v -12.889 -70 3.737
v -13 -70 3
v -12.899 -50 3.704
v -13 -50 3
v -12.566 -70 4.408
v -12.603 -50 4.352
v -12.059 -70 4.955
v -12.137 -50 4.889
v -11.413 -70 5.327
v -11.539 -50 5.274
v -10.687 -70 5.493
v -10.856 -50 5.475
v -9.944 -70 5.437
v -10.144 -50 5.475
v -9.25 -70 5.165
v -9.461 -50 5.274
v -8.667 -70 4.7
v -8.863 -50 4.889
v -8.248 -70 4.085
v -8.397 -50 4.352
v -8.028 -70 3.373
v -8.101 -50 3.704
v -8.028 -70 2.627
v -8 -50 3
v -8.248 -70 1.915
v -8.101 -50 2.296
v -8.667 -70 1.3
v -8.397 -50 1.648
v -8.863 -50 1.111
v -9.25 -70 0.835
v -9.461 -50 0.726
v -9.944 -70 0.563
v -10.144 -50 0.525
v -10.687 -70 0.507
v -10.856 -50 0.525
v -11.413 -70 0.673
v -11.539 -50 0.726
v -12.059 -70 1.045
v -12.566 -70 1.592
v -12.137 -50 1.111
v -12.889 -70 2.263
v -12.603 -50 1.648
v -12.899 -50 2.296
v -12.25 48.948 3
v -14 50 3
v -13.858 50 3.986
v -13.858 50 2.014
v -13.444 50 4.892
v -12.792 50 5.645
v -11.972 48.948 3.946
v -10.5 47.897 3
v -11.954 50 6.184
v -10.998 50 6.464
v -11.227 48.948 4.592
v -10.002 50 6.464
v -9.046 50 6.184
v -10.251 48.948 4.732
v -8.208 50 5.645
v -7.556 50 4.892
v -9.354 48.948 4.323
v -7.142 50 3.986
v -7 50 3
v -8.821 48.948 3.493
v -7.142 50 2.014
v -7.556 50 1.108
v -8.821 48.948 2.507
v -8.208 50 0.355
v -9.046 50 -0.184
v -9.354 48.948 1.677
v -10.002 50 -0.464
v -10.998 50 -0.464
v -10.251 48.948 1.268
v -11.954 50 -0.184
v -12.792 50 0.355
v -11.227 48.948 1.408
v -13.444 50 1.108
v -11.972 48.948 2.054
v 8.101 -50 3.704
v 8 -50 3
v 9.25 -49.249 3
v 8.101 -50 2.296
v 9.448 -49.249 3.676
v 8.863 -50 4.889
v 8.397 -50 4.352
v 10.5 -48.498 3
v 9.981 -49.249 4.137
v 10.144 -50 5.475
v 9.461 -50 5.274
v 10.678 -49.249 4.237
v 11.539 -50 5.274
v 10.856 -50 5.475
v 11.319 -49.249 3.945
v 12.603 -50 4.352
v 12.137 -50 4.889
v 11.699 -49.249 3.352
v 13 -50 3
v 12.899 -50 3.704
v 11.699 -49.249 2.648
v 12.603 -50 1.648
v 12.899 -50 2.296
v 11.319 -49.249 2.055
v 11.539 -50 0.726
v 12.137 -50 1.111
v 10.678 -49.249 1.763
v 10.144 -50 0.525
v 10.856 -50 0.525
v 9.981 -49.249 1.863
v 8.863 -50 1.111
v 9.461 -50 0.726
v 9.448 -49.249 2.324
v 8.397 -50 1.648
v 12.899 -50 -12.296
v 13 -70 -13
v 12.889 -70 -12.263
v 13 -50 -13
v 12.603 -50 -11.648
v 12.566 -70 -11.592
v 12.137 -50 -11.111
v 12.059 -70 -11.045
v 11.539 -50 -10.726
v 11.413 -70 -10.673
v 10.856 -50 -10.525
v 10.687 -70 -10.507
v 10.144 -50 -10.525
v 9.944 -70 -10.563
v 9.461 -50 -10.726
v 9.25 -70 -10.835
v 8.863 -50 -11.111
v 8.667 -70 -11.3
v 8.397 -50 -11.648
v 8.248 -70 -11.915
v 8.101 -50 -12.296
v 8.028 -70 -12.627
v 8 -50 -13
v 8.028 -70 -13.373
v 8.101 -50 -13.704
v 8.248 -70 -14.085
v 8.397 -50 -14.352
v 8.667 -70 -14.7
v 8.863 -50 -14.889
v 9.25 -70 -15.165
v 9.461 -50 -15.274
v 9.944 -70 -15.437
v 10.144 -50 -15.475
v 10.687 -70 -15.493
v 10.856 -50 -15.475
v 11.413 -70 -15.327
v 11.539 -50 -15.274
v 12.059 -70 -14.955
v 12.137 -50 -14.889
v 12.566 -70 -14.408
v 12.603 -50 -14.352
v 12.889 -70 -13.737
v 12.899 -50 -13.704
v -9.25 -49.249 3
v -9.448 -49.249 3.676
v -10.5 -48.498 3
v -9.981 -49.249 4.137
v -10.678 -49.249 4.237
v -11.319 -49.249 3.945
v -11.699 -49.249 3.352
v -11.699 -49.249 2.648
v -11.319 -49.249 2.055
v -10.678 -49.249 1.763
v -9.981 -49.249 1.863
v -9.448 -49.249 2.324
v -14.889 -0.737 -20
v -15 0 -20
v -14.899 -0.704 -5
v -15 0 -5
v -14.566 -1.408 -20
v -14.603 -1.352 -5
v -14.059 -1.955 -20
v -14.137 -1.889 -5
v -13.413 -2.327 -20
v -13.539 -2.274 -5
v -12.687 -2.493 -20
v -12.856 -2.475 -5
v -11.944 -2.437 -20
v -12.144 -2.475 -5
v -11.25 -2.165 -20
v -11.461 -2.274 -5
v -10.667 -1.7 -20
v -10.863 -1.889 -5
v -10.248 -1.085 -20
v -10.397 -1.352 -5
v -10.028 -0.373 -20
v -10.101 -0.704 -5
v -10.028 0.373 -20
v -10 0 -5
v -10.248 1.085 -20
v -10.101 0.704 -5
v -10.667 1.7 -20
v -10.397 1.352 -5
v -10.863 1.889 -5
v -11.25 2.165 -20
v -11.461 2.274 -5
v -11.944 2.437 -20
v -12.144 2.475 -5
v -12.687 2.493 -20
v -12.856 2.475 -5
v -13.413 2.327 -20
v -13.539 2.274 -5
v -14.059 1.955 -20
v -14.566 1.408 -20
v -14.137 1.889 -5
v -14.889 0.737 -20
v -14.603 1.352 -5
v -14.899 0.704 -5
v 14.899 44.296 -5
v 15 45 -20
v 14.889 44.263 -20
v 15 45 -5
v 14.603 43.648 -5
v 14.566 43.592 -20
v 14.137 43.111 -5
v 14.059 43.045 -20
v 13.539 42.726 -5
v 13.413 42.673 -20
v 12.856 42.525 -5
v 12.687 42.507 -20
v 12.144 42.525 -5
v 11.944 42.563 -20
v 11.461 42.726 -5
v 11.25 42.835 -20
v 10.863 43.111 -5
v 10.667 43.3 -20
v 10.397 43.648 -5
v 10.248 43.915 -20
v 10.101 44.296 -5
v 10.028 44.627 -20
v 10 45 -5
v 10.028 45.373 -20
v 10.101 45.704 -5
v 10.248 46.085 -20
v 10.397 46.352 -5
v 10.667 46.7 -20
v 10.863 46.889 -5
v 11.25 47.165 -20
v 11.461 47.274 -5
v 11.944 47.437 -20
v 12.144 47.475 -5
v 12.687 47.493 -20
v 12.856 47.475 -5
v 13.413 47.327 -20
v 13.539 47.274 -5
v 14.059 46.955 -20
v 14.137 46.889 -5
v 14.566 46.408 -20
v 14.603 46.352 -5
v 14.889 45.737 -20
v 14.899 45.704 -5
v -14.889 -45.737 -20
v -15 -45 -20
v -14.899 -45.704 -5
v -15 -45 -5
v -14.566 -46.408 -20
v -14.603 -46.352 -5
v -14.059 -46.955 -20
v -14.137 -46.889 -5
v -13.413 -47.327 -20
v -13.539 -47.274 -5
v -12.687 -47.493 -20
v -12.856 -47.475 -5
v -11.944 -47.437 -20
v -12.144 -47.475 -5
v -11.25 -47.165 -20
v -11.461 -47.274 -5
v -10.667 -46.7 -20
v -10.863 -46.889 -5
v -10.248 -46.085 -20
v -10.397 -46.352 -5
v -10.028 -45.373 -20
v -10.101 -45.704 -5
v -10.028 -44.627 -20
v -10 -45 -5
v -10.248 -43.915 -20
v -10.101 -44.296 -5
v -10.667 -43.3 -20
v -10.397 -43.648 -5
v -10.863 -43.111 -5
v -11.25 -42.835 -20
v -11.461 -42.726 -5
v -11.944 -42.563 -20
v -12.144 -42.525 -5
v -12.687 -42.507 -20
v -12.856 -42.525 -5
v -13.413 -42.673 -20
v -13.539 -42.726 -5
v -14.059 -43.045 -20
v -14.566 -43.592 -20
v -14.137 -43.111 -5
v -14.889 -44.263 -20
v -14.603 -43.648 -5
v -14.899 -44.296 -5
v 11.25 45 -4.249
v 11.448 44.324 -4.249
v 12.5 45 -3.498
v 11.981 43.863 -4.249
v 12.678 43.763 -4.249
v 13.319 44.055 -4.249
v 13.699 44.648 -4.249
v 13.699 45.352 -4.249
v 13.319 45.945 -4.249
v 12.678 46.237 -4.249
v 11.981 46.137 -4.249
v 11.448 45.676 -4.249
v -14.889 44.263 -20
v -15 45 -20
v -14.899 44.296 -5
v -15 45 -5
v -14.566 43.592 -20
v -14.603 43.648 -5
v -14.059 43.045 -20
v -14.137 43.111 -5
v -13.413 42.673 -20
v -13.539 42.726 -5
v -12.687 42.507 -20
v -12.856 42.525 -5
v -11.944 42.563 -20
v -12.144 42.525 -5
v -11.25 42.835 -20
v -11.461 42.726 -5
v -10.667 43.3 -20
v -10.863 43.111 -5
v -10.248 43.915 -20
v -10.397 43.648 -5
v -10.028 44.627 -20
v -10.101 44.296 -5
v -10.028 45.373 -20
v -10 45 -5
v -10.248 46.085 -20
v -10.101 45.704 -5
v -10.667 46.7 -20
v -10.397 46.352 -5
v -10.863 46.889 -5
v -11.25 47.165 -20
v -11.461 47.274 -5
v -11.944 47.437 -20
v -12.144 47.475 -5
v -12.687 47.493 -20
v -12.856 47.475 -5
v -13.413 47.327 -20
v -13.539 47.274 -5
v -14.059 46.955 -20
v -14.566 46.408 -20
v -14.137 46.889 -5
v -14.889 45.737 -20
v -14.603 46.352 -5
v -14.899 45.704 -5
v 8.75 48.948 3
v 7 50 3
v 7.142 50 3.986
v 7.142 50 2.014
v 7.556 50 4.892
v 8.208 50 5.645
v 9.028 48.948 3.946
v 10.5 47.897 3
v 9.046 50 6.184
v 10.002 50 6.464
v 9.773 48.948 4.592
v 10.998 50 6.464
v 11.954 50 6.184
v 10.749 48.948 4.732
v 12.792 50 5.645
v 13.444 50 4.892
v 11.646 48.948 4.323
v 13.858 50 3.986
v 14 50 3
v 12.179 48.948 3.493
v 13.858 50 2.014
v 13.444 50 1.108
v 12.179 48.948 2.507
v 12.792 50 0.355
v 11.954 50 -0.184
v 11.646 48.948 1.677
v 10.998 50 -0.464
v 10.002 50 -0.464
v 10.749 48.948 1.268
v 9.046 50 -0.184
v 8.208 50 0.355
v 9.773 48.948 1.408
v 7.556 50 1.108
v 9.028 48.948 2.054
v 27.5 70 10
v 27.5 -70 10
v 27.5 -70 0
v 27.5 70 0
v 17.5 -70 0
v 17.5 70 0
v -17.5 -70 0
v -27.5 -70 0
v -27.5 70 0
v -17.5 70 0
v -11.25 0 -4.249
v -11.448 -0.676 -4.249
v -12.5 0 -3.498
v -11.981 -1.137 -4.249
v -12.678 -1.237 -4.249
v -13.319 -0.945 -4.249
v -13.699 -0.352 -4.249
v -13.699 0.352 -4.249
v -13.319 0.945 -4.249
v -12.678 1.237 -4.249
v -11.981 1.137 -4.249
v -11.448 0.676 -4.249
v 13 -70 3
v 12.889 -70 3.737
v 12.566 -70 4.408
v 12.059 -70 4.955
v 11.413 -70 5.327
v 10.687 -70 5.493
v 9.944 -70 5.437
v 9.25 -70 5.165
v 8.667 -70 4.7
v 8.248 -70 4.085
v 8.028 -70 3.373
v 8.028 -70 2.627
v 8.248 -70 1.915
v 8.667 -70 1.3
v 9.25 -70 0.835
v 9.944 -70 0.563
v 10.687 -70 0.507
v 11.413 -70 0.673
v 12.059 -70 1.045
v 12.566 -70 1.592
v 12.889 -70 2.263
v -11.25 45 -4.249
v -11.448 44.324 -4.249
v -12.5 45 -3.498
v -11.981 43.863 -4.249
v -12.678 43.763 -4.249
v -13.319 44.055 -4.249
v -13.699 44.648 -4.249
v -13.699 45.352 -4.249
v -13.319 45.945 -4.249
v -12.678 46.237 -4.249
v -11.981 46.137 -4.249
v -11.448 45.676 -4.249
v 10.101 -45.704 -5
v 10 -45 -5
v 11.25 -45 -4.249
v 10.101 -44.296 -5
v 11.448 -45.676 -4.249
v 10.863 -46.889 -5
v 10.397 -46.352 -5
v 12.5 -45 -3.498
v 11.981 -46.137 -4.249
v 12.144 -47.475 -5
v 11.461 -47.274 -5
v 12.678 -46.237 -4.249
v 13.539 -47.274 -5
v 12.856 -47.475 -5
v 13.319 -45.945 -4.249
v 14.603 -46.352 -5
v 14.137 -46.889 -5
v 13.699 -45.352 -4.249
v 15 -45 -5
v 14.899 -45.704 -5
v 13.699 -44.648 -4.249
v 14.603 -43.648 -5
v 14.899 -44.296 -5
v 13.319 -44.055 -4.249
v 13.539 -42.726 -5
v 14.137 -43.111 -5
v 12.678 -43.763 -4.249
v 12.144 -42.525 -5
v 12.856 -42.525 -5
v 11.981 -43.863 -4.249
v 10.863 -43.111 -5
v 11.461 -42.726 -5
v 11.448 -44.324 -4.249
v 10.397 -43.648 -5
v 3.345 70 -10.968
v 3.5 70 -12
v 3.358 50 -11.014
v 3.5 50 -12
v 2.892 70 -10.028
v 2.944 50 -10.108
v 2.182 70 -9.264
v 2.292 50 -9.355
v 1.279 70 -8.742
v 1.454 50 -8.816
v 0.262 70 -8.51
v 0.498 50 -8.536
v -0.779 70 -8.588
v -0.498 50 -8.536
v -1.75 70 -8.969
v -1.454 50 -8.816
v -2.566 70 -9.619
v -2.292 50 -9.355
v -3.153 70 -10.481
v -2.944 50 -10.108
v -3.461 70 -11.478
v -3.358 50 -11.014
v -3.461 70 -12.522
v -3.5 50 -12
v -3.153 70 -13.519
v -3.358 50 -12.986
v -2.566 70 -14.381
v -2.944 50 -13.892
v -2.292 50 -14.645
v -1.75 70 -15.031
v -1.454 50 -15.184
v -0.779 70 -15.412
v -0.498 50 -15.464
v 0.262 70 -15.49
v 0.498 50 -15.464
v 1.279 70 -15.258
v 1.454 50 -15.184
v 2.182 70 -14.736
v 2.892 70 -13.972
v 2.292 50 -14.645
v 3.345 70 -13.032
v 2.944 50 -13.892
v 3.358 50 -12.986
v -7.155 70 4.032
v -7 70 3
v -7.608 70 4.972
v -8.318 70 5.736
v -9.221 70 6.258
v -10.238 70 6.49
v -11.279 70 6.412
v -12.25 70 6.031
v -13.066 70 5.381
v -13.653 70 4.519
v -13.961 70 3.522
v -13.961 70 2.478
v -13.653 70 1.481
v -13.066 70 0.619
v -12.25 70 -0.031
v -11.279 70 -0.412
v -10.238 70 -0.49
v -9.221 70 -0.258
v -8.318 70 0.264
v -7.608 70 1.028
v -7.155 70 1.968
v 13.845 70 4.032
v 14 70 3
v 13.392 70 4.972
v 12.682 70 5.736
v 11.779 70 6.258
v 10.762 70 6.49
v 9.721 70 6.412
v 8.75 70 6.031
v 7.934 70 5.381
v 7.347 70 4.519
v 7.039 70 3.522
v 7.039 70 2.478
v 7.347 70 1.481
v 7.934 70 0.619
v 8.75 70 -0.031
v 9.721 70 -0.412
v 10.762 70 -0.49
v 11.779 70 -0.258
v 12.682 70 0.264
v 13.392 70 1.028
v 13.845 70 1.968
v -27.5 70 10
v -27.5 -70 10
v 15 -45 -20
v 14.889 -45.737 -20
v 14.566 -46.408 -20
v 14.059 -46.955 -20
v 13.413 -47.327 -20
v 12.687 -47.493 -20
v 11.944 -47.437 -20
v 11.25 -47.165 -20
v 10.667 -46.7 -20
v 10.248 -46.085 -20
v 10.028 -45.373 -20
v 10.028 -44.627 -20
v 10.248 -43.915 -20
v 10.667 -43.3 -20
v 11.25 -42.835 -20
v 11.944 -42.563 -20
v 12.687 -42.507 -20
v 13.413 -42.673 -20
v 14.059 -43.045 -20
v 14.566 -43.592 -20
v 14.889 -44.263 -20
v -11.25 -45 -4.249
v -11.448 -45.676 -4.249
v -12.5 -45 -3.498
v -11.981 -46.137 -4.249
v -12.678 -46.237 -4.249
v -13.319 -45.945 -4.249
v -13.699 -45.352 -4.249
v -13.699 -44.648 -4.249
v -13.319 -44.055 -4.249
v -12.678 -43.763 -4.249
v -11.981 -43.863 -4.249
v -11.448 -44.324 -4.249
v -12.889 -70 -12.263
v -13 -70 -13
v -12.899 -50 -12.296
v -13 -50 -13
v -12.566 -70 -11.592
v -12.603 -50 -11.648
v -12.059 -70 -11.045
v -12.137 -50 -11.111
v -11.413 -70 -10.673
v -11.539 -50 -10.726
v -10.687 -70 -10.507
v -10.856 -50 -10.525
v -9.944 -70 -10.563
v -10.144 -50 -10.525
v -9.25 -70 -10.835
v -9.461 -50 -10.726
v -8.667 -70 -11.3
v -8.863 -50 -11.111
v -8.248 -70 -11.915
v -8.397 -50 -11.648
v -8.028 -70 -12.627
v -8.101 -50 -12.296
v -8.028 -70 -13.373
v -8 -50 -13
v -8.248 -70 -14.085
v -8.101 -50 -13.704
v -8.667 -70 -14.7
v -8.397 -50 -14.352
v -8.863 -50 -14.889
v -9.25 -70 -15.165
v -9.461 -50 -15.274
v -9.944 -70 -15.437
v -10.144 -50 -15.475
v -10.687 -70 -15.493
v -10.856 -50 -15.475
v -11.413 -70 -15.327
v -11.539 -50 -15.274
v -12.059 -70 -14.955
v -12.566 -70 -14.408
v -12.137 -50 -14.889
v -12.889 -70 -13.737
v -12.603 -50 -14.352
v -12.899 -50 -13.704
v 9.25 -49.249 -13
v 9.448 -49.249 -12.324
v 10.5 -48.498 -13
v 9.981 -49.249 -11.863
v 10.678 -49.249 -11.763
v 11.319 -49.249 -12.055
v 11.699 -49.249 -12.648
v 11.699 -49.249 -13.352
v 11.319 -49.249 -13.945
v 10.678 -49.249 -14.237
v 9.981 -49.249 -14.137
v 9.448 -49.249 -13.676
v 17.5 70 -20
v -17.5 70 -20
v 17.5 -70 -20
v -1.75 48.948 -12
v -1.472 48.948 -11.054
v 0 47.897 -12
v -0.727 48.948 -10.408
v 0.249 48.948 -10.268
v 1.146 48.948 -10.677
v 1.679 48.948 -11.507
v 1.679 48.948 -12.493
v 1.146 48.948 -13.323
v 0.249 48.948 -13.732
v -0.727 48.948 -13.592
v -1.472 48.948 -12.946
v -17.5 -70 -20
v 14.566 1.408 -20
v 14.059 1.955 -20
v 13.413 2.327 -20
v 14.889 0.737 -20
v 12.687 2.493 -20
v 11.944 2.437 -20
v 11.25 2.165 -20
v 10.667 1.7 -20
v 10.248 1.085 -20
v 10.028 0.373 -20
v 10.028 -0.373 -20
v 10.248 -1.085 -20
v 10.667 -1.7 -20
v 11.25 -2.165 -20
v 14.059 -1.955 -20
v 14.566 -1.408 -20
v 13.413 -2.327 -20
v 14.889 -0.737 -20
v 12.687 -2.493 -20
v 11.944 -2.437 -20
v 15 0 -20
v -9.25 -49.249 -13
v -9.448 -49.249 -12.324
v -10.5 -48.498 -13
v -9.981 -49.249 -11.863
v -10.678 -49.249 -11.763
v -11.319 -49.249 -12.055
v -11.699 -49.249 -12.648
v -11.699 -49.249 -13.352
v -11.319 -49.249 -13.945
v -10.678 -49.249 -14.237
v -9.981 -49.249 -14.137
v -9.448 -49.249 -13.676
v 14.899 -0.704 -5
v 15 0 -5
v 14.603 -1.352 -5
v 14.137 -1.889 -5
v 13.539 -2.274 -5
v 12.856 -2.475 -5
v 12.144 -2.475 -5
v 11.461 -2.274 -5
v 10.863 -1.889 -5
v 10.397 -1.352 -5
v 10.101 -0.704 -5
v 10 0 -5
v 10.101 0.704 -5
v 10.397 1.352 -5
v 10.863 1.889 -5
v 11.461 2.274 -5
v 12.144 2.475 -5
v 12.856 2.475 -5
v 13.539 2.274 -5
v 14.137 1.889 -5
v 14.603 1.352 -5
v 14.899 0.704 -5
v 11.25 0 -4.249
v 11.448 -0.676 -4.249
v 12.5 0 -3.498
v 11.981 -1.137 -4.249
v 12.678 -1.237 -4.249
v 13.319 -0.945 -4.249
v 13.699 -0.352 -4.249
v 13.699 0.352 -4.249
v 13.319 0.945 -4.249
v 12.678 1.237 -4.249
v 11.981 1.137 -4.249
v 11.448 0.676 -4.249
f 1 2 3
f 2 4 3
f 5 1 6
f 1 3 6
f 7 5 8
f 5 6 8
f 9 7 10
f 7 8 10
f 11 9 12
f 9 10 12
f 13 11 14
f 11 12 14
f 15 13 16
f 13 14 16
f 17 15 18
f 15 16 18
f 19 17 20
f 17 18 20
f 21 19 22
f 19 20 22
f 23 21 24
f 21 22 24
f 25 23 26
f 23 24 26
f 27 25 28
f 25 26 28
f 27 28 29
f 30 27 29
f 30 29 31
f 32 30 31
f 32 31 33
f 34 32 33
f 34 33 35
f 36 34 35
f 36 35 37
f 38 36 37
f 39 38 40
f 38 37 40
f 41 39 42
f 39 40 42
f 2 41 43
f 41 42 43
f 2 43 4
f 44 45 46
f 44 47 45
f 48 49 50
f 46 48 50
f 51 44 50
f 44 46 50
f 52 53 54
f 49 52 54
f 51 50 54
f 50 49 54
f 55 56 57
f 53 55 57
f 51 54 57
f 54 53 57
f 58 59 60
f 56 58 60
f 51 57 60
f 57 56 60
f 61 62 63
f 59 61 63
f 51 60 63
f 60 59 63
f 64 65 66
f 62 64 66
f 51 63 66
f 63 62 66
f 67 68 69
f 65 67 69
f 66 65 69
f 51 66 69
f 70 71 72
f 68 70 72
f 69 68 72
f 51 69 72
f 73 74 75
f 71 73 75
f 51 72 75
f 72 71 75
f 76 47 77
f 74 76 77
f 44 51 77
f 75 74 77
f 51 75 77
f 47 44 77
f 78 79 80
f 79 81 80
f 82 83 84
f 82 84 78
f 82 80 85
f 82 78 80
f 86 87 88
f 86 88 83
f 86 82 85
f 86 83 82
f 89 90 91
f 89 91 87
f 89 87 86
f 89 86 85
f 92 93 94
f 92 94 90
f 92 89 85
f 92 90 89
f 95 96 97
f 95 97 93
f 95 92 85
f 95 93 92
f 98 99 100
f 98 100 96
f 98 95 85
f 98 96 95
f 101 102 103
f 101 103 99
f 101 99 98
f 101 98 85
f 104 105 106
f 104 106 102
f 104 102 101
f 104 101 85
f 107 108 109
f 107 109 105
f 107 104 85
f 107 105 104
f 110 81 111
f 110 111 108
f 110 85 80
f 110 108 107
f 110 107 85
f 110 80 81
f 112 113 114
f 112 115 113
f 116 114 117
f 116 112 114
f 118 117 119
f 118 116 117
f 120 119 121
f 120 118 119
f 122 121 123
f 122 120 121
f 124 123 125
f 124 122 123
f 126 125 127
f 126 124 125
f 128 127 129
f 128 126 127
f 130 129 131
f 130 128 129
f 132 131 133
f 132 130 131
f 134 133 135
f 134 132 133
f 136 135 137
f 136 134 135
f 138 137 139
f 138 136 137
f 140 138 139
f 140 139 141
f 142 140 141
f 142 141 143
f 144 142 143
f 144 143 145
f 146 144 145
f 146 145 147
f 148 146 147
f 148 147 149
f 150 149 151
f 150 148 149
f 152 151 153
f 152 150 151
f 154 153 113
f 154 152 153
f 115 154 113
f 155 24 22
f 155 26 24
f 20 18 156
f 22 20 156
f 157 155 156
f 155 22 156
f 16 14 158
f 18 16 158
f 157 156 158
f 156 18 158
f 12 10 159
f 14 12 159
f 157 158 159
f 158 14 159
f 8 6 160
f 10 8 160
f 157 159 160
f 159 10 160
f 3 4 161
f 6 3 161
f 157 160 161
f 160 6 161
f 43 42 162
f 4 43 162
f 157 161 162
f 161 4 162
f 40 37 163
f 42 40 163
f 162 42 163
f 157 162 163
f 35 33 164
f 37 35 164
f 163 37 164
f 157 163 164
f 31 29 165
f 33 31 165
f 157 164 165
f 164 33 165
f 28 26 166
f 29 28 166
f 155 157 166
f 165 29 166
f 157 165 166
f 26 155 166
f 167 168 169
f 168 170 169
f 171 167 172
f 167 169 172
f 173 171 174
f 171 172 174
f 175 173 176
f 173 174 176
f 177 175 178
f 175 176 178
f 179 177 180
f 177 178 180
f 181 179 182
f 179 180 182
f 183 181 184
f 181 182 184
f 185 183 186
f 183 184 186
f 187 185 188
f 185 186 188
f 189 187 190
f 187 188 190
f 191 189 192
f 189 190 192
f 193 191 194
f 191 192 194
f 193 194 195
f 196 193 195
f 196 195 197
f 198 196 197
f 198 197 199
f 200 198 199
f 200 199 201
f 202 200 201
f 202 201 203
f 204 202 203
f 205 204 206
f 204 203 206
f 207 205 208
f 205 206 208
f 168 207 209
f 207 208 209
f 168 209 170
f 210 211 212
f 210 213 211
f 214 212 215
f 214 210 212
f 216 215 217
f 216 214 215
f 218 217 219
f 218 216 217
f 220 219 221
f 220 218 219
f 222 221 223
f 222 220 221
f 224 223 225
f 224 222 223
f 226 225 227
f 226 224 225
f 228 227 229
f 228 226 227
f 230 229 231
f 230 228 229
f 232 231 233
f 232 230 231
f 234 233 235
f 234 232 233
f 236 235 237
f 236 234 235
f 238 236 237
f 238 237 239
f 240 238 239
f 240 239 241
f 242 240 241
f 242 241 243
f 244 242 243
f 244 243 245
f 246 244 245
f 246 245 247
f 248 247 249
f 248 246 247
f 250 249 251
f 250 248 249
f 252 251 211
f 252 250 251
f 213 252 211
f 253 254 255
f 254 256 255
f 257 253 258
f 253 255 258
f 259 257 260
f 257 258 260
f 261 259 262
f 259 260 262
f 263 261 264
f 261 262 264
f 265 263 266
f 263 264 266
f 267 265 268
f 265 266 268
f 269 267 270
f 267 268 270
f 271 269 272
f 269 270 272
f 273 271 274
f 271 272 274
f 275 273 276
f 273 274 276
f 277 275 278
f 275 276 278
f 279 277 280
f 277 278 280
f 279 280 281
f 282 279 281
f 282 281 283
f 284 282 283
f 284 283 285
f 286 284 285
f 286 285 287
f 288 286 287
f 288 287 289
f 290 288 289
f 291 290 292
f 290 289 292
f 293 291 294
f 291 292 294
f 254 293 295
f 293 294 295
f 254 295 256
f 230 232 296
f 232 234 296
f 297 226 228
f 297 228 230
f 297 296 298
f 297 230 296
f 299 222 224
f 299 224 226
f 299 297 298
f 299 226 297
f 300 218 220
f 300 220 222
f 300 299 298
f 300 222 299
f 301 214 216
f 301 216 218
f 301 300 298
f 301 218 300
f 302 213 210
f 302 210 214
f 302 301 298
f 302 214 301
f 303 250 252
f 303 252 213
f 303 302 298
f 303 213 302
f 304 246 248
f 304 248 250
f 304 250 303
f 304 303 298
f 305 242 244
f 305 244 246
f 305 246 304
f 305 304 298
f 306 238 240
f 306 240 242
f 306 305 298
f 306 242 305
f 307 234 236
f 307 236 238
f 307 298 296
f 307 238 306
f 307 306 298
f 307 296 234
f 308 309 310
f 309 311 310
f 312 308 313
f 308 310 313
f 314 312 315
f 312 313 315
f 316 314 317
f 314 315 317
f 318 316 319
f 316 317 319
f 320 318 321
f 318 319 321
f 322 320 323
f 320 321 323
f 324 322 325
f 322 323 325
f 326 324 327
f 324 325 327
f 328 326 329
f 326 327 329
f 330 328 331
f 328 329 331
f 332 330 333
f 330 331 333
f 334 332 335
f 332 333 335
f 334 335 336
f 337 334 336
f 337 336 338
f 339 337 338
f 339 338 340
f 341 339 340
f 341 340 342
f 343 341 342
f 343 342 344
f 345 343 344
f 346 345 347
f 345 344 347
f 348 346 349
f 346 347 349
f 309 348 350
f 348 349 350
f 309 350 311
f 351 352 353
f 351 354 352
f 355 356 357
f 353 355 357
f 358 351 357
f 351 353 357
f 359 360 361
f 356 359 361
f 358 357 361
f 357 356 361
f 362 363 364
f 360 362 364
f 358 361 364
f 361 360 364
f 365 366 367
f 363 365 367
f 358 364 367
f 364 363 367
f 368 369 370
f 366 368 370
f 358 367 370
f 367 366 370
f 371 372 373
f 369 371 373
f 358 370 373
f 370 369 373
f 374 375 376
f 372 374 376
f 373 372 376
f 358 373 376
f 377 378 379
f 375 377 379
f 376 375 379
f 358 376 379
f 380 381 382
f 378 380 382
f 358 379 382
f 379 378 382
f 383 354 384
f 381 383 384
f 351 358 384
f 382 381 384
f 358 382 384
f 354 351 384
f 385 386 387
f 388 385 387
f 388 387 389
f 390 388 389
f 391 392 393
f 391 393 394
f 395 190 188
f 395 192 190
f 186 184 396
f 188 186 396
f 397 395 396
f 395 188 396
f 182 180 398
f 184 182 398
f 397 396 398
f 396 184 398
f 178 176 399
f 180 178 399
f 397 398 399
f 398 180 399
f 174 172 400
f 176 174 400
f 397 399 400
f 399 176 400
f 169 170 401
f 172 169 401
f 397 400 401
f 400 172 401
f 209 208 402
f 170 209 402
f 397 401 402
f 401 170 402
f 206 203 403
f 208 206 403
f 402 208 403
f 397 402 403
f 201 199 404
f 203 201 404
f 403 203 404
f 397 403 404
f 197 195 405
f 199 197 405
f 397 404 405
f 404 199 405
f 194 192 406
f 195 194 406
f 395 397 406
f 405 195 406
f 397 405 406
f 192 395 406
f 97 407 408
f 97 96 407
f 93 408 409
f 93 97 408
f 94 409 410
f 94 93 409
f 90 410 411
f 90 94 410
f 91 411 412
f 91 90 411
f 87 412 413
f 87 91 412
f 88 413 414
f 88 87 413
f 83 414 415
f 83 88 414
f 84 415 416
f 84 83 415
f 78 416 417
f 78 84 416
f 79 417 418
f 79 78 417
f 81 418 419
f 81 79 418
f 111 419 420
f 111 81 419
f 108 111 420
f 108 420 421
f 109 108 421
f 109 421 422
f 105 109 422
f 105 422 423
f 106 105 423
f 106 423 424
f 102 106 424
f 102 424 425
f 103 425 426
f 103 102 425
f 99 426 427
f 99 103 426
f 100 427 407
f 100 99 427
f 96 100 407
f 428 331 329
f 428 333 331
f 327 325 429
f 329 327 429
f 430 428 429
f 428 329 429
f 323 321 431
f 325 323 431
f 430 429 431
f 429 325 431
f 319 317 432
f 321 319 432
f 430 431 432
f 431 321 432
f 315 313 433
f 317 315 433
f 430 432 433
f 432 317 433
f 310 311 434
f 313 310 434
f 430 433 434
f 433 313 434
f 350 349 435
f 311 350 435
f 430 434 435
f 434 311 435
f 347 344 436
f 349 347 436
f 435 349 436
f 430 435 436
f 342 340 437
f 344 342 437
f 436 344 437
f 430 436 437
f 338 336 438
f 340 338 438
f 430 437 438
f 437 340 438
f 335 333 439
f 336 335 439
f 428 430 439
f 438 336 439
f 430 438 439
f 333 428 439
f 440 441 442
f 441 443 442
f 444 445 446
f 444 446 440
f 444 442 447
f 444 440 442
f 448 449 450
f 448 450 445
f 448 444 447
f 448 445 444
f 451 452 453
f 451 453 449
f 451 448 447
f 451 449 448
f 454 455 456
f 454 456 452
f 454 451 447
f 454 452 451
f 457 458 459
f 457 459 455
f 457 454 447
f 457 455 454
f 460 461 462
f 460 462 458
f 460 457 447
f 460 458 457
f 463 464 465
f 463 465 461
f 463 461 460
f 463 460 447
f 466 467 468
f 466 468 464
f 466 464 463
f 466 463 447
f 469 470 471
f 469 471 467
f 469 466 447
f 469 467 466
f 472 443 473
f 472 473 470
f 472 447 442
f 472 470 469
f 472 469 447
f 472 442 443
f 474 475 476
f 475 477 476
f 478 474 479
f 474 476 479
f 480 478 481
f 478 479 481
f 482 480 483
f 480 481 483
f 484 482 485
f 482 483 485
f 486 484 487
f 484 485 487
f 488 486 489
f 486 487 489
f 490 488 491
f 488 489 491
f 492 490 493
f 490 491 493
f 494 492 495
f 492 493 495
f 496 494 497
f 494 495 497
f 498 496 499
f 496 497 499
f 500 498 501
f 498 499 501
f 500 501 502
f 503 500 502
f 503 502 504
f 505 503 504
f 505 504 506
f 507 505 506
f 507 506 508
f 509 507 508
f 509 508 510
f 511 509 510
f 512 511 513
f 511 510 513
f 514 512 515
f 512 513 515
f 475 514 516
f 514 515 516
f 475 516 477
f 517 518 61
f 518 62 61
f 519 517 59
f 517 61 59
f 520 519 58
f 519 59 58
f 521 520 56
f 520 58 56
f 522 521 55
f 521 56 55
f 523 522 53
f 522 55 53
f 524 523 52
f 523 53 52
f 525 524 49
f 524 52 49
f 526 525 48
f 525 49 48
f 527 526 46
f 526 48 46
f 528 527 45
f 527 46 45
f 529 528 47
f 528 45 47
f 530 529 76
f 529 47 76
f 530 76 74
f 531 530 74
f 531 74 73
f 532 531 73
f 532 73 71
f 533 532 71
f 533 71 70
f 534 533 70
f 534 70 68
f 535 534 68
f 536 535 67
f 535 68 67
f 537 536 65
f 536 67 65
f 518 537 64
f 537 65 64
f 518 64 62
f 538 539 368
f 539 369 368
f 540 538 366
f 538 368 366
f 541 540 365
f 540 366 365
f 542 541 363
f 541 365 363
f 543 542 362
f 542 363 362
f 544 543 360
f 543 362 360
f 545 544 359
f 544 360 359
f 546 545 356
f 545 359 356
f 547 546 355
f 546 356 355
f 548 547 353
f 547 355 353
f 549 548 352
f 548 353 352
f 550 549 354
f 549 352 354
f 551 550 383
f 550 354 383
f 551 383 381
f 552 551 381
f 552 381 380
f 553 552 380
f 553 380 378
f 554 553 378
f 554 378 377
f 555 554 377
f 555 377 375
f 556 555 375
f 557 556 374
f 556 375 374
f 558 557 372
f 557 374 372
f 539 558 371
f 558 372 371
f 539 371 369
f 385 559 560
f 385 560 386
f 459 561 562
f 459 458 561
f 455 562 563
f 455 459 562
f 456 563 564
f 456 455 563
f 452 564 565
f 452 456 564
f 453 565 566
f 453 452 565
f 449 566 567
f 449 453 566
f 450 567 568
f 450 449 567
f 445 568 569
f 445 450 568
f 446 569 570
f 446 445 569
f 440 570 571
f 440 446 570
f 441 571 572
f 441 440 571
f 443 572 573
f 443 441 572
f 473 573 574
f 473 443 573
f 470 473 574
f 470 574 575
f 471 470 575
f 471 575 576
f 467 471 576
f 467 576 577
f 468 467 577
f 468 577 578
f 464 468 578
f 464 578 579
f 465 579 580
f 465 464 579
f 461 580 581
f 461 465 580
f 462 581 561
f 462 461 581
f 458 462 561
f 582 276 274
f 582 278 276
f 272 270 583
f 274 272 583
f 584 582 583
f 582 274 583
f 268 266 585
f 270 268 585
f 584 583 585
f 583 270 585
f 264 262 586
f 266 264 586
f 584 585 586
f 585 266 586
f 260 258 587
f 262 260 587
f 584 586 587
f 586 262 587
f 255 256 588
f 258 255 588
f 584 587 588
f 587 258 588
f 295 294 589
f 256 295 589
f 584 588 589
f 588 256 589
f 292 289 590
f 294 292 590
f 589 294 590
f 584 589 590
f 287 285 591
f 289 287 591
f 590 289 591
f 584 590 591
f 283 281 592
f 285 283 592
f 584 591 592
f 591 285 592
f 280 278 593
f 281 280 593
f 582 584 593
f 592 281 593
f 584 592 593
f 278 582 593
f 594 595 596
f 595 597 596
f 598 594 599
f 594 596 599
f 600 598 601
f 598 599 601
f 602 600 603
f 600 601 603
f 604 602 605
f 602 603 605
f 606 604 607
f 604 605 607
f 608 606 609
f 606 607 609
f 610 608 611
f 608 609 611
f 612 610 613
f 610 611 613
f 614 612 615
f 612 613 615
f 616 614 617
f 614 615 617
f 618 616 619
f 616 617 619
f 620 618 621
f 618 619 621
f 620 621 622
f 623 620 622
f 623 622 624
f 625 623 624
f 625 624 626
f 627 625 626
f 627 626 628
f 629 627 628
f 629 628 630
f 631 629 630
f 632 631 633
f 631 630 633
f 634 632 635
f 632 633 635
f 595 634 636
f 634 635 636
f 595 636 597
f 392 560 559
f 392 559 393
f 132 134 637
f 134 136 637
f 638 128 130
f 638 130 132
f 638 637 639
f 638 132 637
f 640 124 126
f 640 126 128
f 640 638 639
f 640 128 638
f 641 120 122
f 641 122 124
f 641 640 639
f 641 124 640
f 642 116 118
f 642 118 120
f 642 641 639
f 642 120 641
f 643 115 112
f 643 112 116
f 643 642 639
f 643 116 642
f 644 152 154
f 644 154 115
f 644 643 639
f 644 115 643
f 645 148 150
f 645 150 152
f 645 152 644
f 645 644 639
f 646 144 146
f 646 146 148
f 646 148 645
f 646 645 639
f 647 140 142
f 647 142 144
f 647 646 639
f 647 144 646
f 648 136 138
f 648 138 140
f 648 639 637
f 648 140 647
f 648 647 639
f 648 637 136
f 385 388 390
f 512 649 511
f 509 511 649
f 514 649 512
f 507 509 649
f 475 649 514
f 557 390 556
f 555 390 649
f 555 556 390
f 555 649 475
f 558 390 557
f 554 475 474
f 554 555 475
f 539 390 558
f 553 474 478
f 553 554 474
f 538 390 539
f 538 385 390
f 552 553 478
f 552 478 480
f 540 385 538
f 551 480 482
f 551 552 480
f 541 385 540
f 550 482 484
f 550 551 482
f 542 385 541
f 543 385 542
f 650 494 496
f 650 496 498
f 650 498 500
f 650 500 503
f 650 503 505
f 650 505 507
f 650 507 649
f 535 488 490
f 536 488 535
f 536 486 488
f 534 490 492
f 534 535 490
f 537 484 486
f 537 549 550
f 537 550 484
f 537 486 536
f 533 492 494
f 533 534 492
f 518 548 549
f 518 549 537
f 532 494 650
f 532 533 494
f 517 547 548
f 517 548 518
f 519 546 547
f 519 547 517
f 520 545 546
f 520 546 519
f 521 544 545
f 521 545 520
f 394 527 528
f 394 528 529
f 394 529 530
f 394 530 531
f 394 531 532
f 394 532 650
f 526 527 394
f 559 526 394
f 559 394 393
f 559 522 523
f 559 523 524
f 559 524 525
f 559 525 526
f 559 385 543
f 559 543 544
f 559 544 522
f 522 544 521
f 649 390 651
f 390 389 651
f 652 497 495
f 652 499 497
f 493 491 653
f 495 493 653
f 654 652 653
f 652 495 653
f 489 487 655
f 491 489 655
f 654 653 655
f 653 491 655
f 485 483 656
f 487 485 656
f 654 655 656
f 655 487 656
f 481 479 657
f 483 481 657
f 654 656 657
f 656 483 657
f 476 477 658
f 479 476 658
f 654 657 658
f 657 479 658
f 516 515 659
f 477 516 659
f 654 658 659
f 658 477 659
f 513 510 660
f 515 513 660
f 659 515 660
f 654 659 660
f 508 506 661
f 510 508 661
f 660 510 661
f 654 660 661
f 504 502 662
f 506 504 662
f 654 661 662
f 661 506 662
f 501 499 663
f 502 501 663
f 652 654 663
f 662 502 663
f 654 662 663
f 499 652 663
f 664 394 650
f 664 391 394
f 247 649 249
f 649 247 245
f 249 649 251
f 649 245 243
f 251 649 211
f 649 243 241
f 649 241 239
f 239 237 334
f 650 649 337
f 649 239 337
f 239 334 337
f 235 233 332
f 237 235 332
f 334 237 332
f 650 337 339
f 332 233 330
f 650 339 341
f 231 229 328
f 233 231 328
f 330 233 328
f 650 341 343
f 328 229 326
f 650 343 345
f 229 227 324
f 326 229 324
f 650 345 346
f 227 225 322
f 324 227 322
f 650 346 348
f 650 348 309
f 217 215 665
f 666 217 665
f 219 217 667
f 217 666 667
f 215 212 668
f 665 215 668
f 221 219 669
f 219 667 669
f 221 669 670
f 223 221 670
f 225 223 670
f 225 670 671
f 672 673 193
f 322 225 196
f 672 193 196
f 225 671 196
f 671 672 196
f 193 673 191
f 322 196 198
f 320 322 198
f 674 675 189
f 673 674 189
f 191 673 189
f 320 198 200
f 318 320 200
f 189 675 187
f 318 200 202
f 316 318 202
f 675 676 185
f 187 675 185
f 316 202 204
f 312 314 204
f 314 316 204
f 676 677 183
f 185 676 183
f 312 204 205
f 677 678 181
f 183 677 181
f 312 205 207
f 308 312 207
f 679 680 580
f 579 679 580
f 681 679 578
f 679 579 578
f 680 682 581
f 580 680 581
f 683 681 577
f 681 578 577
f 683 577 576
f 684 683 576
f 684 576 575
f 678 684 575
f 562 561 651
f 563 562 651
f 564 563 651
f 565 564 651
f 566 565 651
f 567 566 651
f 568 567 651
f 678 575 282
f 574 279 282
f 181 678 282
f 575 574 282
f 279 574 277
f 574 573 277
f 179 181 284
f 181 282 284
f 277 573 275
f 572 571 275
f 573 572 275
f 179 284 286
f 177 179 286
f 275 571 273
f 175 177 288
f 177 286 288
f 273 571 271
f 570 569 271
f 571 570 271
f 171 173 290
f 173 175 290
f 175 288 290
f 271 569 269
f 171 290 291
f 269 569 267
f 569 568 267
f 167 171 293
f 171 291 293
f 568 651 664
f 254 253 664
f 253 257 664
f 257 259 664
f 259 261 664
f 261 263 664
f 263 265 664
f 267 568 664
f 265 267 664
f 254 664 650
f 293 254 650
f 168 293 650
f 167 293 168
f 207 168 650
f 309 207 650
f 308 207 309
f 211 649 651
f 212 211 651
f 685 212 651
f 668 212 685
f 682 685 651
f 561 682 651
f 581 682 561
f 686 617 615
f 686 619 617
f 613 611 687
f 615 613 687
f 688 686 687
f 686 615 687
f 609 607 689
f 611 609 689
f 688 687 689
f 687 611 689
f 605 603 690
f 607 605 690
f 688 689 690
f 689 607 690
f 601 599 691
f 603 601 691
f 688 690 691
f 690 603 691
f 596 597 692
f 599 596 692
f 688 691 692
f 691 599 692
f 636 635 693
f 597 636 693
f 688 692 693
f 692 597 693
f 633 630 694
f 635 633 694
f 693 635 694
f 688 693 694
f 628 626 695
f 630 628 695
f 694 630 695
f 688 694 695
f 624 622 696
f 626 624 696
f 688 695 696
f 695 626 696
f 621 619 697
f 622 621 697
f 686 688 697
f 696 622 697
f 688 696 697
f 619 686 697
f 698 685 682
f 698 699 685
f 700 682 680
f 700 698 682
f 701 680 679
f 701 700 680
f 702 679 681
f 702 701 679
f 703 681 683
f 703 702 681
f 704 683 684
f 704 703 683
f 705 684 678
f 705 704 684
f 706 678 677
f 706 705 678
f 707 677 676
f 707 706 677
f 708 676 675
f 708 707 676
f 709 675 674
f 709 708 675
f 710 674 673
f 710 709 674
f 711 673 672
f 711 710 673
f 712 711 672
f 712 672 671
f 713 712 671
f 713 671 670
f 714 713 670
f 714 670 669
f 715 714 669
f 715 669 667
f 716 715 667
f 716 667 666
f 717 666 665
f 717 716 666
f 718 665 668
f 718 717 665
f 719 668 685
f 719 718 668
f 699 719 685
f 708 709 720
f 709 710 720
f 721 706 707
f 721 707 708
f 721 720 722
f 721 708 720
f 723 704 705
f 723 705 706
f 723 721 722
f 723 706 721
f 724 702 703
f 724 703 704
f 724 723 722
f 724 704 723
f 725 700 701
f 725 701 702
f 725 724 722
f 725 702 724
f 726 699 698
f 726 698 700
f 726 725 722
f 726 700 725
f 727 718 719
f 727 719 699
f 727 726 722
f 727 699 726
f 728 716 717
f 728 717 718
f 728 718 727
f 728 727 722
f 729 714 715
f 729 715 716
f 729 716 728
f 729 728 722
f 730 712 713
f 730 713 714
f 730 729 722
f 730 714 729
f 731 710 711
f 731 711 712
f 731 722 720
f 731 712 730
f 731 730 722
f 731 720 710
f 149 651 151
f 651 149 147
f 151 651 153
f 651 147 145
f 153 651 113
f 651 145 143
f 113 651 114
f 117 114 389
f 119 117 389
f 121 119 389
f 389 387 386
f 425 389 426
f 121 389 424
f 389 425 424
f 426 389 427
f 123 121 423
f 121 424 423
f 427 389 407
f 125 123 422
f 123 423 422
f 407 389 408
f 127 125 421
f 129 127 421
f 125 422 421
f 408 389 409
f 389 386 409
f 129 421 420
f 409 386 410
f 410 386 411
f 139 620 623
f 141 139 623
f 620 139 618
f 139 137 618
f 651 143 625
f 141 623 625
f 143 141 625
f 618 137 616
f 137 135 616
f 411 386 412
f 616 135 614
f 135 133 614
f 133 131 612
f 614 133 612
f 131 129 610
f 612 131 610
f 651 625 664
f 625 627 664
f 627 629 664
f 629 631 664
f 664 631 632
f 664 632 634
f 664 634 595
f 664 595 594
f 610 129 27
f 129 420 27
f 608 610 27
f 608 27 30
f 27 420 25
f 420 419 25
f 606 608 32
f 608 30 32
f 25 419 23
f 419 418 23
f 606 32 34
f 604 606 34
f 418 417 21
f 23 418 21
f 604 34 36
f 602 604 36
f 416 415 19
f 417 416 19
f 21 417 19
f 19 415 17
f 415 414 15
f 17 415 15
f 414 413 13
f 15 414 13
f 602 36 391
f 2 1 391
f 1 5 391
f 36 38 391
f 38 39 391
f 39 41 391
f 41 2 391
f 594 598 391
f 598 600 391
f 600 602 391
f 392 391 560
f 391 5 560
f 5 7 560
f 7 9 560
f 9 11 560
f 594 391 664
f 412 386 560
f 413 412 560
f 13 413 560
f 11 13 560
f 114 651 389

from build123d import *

# Parameters (mm, degrees)
F1_DEPTH = 70
F3_D     = 5
F3_DEPTH = 20
F3_TIP   = 1.5021515476
F5_D     = 5
F5_DEPTH = 15
F5_TIP   = 1.5021515476
F8_D     = 7
F8_DEPTH = 20
F8_TIP   = 2.1030121666


with BuildPart() as f1:
    # F0 (on Front) → F1 (new body, symmetric)
    with BuildSketch(Plane.XZ):
        Polygon((0, -20), (0, 10), (-27.5, 10), (-27.5, 0), (-17.5, 0), (-17.5, -20), align=None)
    extrude(amount=F1_DEPTH, both=True)

    # F3
    with Locations(Plane.XZ.offset(70)):
        with Locations((-10.5, 3), (-10.5, -13)):
            Hole(F3_D / 2, depth=F3_DEPTH)
            with Locations((0, 0, -(F3_DEPTH + F3_TIP / 2))):  # 118° drill point
                Cone(0, F3_D / 2, F3_TIP, mode=Mode.SUBTRACT)

    # F5
    with Locations(Plane(origin=(0, 0, -20), x_dir=(1, 0, 0), z_dir=(0, 0, -1))):
        with Locations((-12.5, 45), (-12.5, 0), (-12.5, -45)):
            Hole(F5_D / 2, depth=F5_DEPTH)
            with Locations((0, 0, -(F5_DEPTH + F5_TIP / 2))):  # 118° drill point
                Cone(0, F5_D / 2, F5_TIP, mode=Mode.SUBTRACT)

    # F6: F1 across plane


with BuildPart() as f1_1:
    add(f1.part)
    add(f1.part.mirror(Plane.YZ))

    # F8
    with Locations(Plane(origin=(0, 70, 0), x_dir=(-1, 0, 0), z_dir=(0, 1, 0))):
        with Locations((-10.5, 3), (10.5, 3), (0, -12)):
            Hole(F8_D / 2, depth=F8_DEPTH)
            with Locations((0, 0, -(F8_DEPTH + F8_TIP / 2))):  # 118° drill point
                Cone(0, F8_D / 2, F8_TIP, mode=Mode.SUBTRACT)


solid = f1_1.part
